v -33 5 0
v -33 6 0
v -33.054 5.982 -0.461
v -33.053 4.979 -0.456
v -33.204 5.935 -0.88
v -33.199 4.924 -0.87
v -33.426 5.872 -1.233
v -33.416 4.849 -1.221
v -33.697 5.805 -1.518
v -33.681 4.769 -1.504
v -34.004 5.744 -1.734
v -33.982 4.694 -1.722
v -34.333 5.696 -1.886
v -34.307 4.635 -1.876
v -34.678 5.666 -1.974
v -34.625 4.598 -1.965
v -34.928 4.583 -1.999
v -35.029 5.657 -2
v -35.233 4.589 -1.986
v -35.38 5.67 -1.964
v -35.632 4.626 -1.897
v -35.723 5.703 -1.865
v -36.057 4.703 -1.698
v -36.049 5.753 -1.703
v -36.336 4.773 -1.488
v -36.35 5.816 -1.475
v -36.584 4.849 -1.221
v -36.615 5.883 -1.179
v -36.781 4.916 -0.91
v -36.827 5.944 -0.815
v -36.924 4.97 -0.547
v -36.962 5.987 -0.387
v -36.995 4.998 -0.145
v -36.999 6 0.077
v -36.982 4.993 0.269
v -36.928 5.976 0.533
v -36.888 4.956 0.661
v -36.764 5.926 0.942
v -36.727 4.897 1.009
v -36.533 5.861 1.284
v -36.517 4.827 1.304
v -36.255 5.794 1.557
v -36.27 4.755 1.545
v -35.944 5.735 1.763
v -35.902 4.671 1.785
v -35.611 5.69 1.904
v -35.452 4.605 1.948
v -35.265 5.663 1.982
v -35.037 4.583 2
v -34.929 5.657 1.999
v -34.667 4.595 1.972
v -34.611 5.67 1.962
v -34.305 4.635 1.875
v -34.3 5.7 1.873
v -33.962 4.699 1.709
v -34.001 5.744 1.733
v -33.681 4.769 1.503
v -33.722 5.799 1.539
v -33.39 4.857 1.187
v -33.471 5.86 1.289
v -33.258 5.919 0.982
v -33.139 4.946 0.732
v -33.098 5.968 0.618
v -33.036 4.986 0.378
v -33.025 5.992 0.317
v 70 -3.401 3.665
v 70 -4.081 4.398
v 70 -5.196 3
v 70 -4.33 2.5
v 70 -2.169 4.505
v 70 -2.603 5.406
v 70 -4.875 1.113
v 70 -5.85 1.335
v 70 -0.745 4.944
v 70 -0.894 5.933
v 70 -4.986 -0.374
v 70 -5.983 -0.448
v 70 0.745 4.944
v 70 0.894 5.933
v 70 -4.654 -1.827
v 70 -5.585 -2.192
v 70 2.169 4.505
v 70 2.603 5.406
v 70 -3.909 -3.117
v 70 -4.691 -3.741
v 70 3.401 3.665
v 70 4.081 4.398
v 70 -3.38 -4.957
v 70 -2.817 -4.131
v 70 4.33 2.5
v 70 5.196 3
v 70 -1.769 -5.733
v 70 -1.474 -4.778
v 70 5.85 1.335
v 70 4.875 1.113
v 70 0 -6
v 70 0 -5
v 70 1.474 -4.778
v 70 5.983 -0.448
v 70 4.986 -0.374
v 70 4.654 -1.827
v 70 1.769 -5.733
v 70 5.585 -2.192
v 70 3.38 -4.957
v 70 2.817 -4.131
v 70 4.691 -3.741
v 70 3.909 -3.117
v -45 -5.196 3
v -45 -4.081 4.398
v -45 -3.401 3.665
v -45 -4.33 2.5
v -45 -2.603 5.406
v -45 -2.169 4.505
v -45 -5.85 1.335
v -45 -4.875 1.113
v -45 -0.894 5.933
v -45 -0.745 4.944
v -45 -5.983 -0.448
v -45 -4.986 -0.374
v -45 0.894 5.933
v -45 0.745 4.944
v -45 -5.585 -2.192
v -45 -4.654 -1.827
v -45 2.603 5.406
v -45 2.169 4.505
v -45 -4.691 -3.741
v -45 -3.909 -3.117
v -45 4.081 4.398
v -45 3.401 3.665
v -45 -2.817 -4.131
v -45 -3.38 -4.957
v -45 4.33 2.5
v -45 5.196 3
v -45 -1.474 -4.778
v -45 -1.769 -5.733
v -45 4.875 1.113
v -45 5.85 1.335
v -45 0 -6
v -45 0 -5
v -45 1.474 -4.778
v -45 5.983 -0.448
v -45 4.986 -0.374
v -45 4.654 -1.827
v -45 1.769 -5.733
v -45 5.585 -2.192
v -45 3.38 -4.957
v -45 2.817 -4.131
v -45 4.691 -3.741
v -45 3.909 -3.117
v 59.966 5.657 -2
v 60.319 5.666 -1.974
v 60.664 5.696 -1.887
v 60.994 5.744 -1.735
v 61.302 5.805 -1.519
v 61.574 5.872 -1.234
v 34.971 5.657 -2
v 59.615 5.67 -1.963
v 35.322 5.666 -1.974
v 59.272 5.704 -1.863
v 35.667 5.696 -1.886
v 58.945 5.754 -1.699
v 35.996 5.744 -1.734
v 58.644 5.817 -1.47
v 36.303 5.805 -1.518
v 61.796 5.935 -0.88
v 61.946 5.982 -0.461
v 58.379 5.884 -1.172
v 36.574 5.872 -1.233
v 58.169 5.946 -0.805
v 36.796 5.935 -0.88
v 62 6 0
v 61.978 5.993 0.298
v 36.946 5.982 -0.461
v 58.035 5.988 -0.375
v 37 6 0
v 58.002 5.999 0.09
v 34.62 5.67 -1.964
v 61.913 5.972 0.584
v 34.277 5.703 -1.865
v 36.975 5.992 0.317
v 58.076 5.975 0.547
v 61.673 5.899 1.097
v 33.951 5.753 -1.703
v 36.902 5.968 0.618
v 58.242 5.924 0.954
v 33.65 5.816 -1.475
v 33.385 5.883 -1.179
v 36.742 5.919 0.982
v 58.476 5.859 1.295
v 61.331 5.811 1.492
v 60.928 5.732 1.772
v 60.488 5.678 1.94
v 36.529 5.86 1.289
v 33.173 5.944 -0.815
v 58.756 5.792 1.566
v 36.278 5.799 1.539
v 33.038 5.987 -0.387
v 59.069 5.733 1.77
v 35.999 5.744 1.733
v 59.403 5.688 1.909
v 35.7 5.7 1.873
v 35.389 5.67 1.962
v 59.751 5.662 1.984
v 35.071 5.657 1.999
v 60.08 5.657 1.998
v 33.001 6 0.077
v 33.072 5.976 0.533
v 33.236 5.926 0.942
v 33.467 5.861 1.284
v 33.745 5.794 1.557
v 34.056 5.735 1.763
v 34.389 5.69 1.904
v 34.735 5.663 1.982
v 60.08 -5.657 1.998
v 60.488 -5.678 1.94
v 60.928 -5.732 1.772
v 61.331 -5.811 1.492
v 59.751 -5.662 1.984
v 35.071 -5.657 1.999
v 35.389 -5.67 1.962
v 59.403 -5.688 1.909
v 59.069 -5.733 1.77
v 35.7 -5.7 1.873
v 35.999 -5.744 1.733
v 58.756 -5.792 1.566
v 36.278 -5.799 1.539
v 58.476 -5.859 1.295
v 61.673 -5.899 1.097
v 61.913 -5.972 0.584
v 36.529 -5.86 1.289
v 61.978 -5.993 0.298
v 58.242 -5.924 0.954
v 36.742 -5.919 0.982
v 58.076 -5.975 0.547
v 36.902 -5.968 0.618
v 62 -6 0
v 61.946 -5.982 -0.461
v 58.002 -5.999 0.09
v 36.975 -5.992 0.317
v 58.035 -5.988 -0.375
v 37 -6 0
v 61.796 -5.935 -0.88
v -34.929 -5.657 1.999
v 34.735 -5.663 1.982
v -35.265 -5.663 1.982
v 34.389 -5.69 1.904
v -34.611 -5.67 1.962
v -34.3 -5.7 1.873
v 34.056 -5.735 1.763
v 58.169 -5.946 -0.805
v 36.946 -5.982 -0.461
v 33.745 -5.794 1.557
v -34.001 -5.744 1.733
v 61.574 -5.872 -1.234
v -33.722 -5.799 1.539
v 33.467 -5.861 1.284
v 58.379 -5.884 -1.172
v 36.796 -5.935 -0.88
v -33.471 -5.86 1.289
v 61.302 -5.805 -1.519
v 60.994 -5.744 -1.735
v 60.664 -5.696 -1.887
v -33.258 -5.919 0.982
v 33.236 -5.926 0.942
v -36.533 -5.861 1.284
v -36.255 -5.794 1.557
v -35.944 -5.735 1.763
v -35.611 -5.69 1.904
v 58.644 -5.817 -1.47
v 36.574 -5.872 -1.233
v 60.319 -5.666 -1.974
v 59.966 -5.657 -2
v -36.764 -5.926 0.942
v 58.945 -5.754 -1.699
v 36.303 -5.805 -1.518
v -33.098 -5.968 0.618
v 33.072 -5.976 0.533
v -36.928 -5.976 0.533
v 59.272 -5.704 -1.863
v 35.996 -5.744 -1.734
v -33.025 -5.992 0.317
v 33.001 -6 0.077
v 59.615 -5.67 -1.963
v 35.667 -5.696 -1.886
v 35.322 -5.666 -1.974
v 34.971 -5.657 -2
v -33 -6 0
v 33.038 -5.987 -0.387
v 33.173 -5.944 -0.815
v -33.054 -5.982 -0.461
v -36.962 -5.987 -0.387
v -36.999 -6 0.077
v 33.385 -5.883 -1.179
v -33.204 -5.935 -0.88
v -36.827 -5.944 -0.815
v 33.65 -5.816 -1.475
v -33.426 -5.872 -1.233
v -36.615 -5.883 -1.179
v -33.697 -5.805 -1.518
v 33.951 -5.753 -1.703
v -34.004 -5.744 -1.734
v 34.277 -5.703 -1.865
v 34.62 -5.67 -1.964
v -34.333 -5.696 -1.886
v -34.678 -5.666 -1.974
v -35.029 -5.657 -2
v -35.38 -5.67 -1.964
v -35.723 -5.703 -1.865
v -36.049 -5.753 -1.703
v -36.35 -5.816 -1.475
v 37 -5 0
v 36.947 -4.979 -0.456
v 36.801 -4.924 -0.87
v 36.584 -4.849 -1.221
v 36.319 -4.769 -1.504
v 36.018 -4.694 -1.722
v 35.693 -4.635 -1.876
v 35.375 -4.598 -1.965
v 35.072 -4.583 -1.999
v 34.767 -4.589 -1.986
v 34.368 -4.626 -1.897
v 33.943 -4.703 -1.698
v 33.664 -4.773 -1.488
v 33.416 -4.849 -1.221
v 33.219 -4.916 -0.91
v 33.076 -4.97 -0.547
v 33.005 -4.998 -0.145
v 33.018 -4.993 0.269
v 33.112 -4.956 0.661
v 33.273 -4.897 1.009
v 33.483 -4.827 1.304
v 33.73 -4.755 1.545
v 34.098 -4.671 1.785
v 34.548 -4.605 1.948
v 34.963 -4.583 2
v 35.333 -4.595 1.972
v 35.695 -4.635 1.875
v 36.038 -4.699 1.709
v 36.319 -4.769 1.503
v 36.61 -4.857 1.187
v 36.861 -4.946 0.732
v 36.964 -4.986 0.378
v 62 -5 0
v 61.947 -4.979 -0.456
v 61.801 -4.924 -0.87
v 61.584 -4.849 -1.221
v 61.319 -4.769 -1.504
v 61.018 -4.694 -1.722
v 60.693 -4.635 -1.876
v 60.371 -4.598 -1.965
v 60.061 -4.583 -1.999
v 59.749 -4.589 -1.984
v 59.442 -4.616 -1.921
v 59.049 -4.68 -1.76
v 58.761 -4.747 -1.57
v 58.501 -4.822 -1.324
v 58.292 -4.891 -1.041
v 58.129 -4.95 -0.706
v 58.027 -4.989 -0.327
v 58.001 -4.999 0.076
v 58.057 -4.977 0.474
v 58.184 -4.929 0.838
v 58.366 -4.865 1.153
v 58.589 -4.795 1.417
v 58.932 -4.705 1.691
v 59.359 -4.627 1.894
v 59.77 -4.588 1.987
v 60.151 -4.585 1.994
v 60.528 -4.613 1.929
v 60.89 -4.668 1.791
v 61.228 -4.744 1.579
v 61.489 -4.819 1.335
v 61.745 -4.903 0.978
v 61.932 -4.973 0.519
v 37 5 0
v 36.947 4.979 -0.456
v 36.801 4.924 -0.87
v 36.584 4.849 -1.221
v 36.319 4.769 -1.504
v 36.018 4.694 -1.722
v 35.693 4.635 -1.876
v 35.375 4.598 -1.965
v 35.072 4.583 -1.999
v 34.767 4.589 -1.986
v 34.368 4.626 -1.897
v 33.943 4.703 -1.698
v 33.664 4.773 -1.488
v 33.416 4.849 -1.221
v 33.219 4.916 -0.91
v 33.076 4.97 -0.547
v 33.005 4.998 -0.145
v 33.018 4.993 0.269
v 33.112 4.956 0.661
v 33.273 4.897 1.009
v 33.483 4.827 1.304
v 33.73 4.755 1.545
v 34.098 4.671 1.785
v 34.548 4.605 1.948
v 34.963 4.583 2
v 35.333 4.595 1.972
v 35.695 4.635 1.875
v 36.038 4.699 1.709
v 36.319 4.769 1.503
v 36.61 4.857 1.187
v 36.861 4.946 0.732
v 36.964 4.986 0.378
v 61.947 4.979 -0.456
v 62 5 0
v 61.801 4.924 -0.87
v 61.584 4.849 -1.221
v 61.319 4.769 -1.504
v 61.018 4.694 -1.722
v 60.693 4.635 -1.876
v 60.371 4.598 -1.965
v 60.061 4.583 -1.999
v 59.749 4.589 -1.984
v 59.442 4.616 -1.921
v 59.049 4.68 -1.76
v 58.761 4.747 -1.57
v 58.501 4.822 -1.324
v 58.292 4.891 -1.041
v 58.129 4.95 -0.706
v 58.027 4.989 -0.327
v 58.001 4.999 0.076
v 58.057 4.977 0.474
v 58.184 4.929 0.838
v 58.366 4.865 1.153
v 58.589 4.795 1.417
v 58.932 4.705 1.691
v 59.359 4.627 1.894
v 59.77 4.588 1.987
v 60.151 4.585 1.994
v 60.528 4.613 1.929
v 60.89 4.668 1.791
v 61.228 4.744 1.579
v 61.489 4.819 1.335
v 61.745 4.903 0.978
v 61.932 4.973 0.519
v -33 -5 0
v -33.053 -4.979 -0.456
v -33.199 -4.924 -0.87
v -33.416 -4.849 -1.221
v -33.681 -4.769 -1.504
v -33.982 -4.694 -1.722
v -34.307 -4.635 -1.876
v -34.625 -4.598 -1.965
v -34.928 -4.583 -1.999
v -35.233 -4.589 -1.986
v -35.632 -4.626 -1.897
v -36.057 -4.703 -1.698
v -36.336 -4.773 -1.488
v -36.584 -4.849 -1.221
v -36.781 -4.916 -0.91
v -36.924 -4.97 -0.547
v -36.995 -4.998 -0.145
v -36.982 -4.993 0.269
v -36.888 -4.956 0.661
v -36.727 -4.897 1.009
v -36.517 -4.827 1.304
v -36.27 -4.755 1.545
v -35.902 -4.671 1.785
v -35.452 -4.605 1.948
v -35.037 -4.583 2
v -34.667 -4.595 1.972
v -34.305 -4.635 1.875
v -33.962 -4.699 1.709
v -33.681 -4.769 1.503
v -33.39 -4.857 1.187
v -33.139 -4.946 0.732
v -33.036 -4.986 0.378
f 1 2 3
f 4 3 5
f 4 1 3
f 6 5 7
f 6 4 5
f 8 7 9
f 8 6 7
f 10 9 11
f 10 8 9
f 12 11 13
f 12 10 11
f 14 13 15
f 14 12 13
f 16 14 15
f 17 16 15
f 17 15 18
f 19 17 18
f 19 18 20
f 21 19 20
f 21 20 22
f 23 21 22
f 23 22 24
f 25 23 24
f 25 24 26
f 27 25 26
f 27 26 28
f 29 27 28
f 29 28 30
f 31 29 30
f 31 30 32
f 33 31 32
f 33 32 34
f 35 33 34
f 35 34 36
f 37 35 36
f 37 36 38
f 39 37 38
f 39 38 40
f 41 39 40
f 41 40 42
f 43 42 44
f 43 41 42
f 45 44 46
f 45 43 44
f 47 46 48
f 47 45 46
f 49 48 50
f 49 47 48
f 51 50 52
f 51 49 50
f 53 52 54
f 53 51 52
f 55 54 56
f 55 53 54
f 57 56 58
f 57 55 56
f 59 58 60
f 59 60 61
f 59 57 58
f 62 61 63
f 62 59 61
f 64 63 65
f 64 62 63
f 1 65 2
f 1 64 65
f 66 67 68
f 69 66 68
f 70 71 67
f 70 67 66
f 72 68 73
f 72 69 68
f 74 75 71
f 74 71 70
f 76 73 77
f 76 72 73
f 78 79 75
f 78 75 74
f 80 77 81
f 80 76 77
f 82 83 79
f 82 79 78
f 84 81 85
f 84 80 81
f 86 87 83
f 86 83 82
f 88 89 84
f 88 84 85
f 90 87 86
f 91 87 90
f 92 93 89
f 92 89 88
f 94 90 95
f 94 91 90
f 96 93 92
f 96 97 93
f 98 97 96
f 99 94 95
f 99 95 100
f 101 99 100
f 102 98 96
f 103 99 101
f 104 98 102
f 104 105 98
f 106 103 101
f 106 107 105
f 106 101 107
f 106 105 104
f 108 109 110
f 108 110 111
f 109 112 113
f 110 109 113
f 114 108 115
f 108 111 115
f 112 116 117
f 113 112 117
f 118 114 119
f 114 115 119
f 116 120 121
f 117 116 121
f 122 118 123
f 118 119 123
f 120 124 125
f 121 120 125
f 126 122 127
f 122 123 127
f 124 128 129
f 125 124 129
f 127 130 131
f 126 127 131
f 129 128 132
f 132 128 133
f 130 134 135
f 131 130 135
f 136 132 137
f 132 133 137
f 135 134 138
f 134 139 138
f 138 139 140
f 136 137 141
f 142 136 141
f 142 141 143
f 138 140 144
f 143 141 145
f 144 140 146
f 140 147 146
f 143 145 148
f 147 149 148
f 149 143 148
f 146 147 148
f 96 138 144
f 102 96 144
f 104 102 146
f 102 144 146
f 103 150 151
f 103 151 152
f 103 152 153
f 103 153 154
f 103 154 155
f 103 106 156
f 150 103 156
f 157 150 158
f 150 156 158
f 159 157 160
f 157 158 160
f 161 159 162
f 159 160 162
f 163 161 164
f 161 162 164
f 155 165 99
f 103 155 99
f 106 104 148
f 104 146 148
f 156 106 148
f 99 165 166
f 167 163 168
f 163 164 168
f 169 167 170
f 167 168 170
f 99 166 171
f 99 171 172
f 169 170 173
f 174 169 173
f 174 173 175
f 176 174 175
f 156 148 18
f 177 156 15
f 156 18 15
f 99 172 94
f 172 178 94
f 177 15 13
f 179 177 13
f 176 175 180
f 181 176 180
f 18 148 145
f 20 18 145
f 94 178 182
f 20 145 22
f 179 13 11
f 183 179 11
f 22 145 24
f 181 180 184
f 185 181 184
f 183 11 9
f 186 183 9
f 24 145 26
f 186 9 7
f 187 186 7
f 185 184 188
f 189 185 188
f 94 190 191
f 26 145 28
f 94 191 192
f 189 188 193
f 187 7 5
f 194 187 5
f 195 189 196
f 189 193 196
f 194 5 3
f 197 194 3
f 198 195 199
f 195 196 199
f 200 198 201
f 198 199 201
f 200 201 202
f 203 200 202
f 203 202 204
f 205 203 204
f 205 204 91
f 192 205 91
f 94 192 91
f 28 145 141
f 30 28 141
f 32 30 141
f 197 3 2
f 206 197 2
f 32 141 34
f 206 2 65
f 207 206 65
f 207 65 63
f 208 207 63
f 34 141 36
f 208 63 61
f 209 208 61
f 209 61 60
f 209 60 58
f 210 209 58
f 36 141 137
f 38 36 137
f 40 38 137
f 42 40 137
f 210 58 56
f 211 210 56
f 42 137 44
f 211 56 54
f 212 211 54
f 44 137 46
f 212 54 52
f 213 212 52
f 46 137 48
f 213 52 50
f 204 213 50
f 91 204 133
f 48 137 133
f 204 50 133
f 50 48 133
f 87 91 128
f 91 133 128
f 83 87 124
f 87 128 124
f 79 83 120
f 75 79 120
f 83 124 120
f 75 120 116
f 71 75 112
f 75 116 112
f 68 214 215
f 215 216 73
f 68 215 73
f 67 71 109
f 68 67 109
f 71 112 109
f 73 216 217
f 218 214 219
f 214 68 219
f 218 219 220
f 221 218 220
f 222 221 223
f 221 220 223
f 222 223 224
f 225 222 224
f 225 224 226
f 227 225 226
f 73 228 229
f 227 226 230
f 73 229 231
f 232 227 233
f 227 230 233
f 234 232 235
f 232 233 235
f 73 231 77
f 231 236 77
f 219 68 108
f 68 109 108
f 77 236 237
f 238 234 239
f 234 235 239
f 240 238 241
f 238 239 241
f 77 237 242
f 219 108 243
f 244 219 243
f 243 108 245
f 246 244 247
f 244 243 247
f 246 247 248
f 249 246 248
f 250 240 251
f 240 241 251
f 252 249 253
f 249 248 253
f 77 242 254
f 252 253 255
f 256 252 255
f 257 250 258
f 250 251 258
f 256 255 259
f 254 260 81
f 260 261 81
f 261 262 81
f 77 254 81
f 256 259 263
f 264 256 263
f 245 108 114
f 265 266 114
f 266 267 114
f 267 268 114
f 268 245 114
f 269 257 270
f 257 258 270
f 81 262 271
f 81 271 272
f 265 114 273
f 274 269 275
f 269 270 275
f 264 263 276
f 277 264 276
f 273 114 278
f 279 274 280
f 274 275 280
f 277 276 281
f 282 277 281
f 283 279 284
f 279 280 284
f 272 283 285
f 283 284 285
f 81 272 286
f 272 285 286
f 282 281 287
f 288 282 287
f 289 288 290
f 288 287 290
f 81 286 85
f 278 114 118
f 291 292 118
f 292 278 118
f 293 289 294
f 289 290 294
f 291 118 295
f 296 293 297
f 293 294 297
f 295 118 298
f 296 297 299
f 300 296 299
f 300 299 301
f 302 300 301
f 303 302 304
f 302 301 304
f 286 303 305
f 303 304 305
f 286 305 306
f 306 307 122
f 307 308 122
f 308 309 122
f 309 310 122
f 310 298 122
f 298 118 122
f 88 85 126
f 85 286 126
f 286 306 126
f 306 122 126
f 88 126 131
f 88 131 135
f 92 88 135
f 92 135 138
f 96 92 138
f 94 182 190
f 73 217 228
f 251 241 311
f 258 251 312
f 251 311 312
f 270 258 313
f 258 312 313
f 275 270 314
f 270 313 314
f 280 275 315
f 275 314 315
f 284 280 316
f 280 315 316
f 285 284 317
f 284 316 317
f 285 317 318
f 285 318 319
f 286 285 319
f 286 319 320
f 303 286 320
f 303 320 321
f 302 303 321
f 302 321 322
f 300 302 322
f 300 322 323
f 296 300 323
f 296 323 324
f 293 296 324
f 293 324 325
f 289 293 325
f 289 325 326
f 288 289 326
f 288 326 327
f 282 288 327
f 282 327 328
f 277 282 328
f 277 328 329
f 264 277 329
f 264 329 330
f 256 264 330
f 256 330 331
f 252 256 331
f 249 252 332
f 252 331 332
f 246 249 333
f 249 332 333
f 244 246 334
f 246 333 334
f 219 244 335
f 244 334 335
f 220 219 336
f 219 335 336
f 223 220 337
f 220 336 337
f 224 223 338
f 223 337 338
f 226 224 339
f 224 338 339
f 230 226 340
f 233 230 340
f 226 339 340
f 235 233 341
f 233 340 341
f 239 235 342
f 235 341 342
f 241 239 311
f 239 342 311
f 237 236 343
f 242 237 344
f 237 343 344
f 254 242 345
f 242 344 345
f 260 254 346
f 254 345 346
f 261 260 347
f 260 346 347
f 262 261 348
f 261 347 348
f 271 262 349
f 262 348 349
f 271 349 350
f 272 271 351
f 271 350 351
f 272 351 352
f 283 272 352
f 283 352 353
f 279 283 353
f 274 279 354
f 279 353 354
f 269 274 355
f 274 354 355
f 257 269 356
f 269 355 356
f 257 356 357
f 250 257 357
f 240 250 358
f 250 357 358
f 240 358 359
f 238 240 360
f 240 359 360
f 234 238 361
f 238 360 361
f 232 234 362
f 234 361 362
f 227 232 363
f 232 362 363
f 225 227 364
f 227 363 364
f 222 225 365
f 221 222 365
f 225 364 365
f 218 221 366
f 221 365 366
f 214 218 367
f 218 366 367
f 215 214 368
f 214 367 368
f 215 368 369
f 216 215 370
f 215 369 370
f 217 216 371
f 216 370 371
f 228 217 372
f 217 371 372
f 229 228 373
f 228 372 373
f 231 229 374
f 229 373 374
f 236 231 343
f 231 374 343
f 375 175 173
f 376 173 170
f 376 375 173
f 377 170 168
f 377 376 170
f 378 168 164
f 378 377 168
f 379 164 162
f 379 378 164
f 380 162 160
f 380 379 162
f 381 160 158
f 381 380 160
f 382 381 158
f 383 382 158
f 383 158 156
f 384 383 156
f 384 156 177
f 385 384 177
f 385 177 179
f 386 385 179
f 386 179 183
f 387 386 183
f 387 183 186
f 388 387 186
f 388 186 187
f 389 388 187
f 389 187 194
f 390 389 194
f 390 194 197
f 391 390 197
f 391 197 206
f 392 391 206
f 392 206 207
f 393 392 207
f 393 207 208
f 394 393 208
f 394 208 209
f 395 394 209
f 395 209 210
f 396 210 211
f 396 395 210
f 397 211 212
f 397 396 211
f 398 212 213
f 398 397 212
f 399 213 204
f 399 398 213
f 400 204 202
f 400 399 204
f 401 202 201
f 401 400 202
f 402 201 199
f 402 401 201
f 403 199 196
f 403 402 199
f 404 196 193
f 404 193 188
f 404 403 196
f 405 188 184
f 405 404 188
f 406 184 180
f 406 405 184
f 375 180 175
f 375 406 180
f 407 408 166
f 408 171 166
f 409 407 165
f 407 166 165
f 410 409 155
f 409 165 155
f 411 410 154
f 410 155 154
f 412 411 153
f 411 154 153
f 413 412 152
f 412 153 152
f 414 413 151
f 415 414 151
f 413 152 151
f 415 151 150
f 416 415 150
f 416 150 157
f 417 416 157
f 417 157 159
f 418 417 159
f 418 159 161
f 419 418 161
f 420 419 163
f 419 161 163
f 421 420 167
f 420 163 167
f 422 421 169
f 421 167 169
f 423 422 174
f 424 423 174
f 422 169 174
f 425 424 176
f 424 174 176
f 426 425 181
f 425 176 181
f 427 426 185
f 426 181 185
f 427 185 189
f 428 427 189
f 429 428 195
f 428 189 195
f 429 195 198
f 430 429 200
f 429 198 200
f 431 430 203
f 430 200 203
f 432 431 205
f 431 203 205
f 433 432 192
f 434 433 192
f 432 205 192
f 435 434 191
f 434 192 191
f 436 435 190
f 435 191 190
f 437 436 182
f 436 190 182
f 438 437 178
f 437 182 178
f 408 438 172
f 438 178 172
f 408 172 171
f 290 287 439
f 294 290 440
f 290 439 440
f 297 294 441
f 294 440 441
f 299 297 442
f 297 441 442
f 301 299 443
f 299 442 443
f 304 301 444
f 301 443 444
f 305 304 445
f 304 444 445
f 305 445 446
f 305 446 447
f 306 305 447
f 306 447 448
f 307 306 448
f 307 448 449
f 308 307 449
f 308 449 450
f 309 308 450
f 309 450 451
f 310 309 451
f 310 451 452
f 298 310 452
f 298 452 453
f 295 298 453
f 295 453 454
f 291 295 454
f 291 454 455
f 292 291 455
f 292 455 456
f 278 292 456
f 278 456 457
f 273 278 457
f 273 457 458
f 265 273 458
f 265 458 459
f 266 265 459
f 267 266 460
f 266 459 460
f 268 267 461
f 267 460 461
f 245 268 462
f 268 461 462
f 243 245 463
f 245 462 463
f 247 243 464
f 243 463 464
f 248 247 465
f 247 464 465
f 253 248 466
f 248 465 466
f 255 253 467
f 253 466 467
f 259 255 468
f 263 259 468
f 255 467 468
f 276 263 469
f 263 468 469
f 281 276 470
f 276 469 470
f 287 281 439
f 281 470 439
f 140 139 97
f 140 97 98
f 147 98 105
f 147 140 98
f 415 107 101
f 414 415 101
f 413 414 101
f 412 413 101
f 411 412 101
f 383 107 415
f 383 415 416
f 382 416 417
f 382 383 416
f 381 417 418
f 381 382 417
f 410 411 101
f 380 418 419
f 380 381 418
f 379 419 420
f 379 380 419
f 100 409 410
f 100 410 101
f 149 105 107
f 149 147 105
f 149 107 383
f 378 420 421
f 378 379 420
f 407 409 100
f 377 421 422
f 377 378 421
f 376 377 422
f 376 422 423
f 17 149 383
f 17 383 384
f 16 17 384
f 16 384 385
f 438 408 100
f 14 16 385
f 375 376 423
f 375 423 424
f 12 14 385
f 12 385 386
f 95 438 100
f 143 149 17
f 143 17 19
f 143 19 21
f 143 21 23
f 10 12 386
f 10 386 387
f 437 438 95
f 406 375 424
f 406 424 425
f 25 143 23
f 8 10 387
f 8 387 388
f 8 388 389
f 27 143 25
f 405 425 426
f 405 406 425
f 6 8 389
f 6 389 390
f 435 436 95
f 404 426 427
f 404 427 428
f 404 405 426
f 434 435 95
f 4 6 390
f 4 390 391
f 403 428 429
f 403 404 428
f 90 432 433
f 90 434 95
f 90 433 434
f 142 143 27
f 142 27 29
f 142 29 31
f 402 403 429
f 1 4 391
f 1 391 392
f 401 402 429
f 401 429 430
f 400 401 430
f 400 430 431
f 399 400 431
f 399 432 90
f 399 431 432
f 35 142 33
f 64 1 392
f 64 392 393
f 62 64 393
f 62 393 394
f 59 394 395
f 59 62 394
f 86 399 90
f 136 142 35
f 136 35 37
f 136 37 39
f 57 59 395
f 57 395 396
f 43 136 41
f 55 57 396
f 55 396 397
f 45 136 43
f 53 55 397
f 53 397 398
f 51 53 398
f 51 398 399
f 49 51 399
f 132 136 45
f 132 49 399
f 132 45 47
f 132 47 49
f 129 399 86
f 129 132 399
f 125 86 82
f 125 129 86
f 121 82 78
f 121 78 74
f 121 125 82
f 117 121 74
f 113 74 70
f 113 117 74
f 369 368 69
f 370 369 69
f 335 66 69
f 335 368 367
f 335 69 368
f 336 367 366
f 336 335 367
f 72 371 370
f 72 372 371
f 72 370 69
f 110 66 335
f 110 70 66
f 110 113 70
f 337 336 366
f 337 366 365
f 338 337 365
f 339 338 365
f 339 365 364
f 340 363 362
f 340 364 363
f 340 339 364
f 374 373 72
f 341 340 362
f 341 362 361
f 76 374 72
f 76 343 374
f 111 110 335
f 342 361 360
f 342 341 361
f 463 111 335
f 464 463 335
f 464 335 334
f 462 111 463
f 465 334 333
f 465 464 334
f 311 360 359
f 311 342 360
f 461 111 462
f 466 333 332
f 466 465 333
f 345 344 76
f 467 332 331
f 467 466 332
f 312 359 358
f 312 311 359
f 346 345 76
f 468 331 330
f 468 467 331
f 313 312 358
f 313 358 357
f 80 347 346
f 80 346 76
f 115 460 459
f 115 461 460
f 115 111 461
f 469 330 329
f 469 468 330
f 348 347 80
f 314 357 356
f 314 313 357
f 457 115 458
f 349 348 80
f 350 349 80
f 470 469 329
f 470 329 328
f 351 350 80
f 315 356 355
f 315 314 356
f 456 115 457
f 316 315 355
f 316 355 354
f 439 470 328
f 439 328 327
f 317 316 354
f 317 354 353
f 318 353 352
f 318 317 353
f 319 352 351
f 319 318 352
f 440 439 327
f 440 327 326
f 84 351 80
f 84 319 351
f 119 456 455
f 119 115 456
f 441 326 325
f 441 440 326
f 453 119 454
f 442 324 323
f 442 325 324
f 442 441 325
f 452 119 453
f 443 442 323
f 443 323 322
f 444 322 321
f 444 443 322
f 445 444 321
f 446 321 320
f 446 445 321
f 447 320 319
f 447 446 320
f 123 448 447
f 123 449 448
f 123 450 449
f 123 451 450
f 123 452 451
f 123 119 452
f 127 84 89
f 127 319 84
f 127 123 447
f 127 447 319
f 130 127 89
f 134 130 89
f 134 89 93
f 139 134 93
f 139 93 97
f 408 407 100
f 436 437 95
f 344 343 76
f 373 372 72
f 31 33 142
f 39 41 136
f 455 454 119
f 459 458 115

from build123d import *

# Parameters (mm, degrees)
SKETCH1_R           = 6
SKETCH1_R_2         = 5
BOSS_EXTRUDE1_DEPTH = 45
SKETCH3_R           = 6
SKETCH3_R_2         = 5
BOSS_EXTRUDE2_DEPTH = 25
SKETCH2_R           = 2
CUT_EXTRUDE1_DEPTH  = 10


with BuildPart() as part:
    # Sketch1 → Boss-Extrude1 (new body, symmetric)
    with BuildSketch(Plane(origin=(0, 0, 0), x_dir=(0, 0, -1), z_dir=(1, 0, 0))):
        Circle(SKETCH1_R)
        Circle(SKETCH1_R_2, mode=Mode.SUBTRACT)
    extrude(amount=BOSS_EXTRUDE1_DEPTH, both=True)

    # Sketch3 → Boss-Extrude2 (add)
    with BuildSketch(Plane(origin=(45, 0, 0), x_dir=(0, 0, -1), z_dir=(1, 0, 0))):
        Circle(SKETCH3_R)
        Circle(SKETCH3_R_2, mode=Mode.SUBTRACT)
    extrude(amount=BOSS_EXTRUDE2_DEPTH)

    # Sketch2 → Cut-Extrude1 (cut, symmetric)
    with BuildSketch(Plane(origin=(0, 0, 0), x_dir=(1, 0, 0), z_dir=(0, 1, 0))):
        with Locations((-35, 0)):
            Circle(SKETCH2_R)
        with Locations((35, 0)):
            Circle(SKETCH2_R)
        with Locations((60, 0)):
            Circle(SKETCH2_R)
    extrude(amount=CUT_EXTRUDE1_DEPTH, both=True, mode=Mode.SUBTRACT)


solid = part.part
